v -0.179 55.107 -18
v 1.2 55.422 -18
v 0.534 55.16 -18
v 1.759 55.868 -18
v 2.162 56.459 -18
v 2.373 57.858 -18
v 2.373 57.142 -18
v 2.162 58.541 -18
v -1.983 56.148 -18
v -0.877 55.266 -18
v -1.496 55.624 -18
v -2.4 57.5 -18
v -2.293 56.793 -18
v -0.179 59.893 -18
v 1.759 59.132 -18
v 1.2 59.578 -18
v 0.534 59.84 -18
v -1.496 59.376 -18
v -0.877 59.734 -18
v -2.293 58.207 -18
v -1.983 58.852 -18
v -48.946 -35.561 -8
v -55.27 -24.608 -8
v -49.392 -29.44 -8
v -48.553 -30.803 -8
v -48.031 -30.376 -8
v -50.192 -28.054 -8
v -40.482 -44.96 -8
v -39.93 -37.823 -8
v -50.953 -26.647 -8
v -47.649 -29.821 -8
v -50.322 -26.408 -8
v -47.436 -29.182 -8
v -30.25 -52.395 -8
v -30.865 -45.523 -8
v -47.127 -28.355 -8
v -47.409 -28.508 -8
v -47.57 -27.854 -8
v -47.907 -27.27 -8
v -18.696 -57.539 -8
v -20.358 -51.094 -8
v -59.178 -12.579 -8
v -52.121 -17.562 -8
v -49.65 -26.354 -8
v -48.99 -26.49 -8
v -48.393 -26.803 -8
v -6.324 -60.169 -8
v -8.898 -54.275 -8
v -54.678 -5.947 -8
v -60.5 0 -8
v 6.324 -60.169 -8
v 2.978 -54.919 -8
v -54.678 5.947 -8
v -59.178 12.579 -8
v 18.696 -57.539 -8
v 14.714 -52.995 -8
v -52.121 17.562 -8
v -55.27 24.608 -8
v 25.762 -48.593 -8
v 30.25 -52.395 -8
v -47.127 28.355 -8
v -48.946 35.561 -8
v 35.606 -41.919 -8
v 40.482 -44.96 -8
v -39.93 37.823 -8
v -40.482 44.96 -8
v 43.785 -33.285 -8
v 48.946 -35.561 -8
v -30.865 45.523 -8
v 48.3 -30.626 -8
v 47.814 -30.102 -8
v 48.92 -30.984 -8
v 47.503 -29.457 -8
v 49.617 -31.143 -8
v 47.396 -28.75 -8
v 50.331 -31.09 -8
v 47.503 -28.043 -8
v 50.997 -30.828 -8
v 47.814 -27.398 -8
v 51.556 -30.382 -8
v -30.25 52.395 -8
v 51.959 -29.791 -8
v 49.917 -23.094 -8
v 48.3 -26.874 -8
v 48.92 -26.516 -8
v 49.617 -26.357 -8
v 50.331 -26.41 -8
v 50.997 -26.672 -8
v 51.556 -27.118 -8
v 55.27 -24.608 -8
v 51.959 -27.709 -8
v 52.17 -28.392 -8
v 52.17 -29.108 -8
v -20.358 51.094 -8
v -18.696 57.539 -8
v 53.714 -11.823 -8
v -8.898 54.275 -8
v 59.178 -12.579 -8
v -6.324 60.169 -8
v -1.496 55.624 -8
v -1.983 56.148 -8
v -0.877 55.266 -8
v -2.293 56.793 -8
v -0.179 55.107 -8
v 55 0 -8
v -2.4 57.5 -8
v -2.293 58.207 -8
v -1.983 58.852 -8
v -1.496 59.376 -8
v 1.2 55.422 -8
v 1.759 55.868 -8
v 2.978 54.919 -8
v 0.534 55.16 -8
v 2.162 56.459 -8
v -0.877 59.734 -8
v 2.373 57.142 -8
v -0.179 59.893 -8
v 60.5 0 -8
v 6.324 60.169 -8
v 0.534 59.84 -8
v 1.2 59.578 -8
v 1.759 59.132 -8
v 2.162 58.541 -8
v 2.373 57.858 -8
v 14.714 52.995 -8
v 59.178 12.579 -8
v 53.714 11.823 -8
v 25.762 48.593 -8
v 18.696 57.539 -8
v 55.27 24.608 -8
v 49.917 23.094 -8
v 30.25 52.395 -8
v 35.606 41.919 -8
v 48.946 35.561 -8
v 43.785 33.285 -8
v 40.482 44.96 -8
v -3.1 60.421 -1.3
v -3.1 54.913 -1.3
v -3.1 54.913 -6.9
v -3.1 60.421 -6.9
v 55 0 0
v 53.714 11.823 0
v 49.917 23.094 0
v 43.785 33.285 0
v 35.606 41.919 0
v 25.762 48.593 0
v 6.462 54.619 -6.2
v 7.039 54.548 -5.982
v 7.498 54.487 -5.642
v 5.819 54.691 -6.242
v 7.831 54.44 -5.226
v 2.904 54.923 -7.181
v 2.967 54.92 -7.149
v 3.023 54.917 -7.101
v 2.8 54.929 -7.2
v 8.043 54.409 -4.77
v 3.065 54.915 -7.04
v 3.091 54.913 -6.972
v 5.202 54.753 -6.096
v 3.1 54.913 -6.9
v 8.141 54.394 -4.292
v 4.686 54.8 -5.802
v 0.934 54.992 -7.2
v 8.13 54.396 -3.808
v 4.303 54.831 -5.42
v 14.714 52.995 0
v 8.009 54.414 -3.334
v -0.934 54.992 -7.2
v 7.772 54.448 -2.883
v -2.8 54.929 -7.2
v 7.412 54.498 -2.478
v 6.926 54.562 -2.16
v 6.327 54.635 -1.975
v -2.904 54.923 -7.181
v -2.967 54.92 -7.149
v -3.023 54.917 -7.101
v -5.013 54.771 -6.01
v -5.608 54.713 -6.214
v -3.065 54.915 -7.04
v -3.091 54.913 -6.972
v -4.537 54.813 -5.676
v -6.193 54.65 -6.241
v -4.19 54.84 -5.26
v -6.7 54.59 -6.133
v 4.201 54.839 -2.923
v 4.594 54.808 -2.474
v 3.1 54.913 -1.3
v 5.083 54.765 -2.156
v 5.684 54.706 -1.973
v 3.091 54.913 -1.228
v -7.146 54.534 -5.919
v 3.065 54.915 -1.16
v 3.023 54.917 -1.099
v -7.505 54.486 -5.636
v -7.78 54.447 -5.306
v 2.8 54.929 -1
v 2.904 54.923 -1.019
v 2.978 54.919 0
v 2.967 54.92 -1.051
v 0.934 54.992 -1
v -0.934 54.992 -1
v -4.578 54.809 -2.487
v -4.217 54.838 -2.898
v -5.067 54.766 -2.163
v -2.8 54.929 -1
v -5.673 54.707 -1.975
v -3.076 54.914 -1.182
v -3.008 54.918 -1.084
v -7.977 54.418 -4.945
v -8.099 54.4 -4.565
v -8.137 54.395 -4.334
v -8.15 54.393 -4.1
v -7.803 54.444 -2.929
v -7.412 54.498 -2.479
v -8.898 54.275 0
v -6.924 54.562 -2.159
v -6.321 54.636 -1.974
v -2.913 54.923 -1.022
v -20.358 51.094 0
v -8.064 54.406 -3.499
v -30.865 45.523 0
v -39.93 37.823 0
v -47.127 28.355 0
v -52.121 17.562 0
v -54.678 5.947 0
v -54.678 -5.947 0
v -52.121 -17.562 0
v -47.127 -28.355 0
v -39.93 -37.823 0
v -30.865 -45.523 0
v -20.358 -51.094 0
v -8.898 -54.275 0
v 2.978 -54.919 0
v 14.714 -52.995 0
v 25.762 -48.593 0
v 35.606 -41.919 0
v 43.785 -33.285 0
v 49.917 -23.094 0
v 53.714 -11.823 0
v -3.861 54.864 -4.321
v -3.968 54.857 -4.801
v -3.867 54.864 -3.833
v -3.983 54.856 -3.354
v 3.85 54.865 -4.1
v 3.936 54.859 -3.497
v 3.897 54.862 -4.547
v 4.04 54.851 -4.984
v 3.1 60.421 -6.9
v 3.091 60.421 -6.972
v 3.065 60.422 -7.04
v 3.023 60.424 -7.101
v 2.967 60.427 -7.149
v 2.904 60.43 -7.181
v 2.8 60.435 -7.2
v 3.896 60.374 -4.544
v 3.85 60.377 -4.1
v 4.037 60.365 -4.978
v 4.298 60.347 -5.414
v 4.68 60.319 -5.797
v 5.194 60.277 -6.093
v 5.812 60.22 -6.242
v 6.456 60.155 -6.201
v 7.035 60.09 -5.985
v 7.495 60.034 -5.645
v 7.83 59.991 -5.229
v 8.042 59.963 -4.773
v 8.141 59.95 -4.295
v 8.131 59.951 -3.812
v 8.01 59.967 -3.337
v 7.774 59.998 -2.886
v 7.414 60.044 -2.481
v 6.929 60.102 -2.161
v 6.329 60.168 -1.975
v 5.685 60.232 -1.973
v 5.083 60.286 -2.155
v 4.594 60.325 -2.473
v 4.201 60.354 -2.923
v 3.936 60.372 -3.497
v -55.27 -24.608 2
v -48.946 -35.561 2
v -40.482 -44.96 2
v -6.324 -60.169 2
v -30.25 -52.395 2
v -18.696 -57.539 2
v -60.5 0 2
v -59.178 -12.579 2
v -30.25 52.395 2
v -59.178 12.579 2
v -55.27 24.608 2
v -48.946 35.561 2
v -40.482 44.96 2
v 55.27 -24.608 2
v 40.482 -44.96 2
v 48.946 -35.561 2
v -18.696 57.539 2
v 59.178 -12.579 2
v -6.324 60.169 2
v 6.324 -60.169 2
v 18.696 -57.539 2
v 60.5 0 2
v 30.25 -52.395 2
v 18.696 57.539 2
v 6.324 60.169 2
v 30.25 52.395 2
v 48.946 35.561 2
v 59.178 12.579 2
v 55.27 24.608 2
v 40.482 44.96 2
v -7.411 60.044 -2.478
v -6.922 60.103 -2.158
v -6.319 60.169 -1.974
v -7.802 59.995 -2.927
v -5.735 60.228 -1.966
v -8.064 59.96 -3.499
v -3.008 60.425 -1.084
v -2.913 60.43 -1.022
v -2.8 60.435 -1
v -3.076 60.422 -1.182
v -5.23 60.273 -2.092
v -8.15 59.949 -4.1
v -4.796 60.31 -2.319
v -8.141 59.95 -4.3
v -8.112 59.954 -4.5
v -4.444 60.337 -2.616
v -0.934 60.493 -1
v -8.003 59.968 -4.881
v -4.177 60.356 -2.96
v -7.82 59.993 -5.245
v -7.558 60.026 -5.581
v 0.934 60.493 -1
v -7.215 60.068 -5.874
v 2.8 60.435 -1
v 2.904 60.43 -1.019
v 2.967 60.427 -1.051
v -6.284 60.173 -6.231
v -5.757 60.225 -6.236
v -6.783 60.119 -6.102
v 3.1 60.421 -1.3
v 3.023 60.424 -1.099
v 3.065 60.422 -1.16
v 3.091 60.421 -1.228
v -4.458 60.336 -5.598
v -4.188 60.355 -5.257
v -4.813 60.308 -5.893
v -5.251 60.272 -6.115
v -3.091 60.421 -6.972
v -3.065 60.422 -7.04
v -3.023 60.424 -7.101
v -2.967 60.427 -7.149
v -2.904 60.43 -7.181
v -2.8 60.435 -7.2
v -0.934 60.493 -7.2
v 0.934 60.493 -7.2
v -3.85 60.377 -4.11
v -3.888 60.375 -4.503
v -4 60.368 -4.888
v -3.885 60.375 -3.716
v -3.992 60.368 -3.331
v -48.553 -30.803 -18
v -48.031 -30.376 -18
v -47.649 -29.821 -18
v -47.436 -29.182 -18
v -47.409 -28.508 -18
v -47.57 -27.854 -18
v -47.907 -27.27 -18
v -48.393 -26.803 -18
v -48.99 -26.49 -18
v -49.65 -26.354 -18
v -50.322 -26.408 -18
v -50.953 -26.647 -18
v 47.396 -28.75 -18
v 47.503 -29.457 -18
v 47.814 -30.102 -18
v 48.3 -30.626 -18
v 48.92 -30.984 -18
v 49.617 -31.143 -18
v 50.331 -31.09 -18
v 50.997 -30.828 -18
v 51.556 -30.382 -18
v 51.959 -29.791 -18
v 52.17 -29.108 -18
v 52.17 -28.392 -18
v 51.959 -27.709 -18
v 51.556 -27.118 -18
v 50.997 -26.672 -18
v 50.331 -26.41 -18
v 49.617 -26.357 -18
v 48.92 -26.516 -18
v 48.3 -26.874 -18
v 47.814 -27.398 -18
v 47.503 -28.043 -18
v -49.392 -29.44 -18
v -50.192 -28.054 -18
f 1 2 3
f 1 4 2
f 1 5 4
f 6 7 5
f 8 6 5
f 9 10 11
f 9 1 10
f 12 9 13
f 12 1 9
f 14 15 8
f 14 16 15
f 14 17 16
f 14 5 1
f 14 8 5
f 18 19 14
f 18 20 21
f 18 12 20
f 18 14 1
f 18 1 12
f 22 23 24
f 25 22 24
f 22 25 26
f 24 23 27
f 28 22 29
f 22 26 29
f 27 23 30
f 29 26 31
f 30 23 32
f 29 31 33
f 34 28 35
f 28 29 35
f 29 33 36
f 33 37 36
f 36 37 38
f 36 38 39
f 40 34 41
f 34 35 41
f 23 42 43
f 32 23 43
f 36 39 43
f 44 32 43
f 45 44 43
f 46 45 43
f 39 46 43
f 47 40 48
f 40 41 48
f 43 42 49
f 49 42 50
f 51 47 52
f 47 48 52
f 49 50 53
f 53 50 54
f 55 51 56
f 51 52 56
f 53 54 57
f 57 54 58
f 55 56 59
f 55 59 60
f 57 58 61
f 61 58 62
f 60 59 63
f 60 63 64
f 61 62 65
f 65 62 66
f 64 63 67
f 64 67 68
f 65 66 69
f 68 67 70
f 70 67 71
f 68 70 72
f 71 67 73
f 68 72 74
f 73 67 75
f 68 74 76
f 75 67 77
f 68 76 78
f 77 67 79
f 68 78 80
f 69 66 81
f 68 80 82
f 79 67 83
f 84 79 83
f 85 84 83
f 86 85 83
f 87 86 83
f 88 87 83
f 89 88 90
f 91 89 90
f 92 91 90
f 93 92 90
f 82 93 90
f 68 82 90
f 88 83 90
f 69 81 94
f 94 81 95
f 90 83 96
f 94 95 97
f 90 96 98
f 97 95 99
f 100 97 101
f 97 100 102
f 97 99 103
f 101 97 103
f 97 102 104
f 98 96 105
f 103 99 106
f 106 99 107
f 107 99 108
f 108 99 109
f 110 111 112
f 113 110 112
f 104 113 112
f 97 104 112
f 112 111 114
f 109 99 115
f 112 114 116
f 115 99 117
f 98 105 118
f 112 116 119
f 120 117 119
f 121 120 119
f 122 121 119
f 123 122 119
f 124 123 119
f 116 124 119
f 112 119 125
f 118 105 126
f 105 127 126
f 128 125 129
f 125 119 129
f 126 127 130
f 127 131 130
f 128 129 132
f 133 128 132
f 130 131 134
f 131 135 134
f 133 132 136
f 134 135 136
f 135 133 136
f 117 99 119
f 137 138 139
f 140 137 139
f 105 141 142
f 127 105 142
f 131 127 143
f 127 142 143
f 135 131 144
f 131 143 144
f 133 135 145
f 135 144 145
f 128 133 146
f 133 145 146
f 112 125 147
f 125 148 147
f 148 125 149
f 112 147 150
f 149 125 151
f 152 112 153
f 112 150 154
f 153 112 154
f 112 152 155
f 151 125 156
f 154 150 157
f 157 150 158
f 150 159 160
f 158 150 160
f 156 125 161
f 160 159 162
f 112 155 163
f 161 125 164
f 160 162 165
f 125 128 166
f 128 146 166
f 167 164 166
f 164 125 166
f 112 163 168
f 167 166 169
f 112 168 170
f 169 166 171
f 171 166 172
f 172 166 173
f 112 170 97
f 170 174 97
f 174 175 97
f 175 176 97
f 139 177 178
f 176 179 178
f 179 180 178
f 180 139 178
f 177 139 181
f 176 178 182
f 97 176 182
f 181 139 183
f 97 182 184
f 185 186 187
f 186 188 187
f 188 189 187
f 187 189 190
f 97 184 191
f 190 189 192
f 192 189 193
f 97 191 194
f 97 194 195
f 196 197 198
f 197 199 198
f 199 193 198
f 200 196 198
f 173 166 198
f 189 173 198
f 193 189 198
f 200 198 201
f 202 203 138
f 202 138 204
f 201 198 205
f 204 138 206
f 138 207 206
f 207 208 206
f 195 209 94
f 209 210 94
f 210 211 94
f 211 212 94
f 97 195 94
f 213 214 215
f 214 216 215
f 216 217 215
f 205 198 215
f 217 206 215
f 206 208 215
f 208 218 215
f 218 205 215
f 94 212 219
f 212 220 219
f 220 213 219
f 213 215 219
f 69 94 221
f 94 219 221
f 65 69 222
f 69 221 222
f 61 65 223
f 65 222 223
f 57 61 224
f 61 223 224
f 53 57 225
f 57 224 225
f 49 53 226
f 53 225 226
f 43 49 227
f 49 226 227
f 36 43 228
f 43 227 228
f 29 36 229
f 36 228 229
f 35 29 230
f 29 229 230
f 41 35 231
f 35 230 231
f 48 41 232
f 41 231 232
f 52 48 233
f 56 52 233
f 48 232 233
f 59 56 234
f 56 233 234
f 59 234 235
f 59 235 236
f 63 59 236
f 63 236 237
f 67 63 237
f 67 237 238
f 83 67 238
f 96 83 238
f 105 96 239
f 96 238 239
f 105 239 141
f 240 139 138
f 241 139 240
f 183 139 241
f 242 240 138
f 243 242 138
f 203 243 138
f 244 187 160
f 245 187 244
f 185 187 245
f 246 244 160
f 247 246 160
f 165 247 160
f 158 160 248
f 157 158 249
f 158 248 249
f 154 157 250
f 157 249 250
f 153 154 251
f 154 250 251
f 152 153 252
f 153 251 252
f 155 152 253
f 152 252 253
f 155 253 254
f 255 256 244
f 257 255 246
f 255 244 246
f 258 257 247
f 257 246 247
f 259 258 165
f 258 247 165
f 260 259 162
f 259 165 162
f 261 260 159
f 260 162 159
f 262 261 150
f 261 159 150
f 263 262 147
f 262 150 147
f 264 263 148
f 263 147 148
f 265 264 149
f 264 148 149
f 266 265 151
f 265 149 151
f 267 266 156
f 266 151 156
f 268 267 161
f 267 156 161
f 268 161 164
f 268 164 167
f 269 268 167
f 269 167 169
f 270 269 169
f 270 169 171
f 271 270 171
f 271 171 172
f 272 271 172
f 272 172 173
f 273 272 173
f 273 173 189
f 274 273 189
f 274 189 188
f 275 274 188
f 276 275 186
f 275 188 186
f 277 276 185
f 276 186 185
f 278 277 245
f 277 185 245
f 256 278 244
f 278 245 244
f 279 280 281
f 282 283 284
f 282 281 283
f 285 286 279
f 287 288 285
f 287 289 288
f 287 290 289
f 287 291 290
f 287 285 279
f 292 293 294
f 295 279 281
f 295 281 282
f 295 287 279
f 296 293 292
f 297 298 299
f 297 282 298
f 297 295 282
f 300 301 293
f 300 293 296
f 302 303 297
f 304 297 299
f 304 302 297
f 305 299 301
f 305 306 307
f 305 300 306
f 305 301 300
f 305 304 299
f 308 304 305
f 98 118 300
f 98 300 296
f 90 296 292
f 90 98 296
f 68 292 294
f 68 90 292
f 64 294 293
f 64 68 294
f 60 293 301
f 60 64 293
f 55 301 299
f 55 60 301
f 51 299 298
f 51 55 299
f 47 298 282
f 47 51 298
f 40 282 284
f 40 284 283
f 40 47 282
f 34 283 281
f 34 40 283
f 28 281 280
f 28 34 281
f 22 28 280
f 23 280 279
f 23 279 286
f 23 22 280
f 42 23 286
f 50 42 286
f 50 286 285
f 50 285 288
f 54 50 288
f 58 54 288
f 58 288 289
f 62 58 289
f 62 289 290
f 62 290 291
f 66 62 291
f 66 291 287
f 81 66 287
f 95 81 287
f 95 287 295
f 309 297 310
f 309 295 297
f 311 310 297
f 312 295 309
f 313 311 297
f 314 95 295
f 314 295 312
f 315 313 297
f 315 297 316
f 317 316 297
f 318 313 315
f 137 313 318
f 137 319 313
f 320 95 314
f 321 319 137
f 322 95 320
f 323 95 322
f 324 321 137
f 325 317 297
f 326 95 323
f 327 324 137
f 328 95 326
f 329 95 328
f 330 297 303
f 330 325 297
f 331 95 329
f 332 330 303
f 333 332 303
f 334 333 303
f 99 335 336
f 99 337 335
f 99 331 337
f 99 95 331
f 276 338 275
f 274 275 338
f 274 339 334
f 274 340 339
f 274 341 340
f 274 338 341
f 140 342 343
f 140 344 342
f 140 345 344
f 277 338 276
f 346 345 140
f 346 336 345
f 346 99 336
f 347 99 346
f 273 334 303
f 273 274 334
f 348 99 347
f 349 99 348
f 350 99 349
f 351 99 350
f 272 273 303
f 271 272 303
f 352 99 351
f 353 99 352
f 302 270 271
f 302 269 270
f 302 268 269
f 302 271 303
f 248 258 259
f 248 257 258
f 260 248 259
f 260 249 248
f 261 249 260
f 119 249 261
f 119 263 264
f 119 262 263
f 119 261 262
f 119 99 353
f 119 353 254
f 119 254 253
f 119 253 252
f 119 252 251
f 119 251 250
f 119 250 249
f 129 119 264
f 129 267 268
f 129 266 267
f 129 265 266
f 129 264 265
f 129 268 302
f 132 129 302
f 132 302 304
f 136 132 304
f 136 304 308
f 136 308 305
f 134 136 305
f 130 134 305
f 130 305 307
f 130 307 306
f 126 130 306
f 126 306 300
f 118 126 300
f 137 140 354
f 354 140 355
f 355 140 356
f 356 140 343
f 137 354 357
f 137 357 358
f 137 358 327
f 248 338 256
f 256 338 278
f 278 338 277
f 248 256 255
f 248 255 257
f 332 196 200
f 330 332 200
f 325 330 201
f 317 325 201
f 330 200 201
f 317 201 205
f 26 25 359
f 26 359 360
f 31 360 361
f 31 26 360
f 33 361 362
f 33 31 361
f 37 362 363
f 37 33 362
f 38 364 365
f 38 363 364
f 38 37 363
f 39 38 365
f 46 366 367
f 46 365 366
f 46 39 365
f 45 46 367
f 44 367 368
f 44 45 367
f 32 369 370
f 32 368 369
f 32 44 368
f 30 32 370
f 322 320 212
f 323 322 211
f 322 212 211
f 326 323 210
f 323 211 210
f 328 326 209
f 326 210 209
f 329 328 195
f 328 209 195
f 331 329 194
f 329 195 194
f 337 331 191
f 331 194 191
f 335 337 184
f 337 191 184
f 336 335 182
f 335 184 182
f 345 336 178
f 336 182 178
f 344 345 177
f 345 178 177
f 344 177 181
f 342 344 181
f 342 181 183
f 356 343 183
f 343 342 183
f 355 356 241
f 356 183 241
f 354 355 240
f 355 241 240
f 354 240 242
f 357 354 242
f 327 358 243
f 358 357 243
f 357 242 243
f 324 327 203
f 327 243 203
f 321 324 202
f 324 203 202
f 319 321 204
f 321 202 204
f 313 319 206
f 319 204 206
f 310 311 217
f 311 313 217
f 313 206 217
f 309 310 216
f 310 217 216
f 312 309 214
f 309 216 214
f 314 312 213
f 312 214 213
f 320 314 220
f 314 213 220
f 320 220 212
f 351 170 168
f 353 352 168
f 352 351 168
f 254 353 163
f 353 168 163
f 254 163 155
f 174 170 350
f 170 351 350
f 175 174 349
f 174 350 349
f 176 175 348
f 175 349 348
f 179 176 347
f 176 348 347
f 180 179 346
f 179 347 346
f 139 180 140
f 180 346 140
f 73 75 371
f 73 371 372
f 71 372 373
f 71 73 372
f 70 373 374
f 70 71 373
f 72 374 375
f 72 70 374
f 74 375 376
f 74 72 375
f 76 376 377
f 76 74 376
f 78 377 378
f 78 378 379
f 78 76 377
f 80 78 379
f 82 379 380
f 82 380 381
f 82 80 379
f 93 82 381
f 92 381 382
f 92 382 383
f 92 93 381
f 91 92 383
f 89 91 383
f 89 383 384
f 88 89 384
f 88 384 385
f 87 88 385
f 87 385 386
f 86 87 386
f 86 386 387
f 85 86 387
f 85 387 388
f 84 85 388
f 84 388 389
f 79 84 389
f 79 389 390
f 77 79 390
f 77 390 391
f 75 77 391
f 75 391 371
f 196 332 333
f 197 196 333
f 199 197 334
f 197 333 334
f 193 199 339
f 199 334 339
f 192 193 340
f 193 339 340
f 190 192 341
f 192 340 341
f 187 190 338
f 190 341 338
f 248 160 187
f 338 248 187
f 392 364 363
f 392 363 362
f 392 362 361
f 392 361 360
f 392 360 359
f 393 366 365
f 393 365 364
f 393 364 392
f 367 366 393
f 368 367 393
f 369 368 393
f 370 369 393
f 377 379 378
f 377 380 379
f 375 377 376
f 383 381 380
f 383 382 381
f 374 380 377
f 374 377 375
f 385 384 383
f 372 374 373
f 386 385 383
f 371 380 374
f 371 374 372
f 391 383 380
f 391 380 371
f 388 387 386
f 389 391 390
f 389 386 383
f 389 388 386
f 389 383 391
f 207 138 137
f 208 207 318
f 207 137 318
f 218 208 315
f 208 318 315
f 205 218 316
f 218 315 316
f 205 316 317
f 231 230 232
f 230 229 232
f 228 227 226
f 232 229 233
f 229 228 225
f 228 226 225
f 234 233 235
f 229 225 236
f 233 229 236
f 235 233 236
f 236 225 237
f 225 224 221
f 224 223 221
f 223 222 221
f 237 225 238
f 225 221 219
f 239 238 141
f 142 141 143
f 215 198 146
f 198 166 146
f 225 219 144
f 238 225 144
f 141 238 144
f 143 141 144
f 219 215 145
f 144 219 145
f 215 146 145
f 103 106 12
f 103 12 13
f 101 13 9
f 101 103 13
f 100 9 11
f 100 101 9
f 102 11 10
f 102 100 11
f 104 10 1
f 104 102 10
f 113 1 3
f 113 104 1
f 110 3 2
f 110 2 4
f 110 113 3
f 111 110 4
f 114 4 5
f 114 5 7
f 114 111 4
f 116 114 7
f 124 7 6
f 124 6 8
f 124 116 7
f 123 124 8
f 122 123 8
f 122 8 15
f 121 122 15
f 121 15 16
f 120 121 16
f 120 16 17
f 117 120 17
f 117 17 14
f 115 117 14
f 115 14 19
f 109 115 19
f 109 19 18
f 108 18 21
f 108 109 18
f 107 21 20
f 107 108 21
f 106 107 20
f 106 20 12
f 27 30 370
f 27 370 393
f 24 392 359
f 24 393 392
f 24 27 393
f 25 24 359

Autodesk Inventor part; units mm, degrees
ref_plane "YZ Plane" through (0, 0, 0) normal (1, 0, 0) x (0, 1, 0)
ref_plane "XZ Plane" through (0, 0, 0) normal (0, 1, 0) x (-1, 0, 0)
ref_plane "XY Plane" through (0, 0, 0) normal (0, 0, 1) x (1, 0, 0)
sketch "Sketch1" plane through (0, 0, 0) normal (0, 0, 1) x (1, 0, 0)
  circle A0 centre (0, 0) radius 60.5
  circle A1 centre (0, 0) radius 55
  line L0 (0, 55) -> (-10, 55)
  line L1 (0, 55) -> (10, 55)
  line L2 (0, 55) -> (10, 55) construction
  line L3 (10, 59.6678) -> (10, 53.8845)
  line L4 (-10, 59.6678) -> (-10, 54.0833)
  point P0 (10, 54.0833)
  dimension "d0" = 121
  dimension "d1" = 110
  dimension "d45" = 10
  dimension "d46" = 10
  dimension "d47" = 0
extrude "Extrusion1" add sketch "Sketch1" along normal blind 2
extrude "Extrusion2" add sketch "Sketch1" against normal blind 8 contours A0 L4 A1 L3 | L3 L1 L0 L4 A0 | L3 A1 L1 | L0 A1 L4
sketch "Sketch11" plane through (0, 0, 0) normal (1, 0, 0) x (0, 1, 0)
  line L0 (60.5, 2) -> (-60.5, 2) projected
  line L1 (-60.5, -8) -> (60.5, -8) projected
  line L2 (59.6678, 0) -> (54.0833, 0) projected
  line L3 (59.6678, 0) -> (59.6678, -6) projected
  line L4 (54.0833, -6) -> (59.6678, -6) projected
  line L5 (54.0833, 0) -> (54.0833, -6) projected
  line L6 (-60.5, -8) -> (60.5, -8) projected
  line L7 (55, -8) -> (-55, -8) projected
  line L8 (-60.5, -8) -> (60.5, -8) projected
  line L9 (60.5, 0) -> (-60.5, 0) projected
  line L10 (-55, -8) -> (-61, -8)
  line L11 (-61, -8) -> (-61, 0)
  line L12 (-61, 0) -> (-55, 0)
  line L13 (-55, 0) -> (-55, -8)
  line L14 (-61, -8) -> (-55, 0)
  circle A0 centre (-58, -4) radius 2.1
  line L15 (-61, -8) -> (-67, -8)
  line L16 (-67, -8) -> (-67, -2)
  line L17 (-67, -2) -> (-61, -2)
  line L18 (-61, -2) -> (-61, -8)
  line L19 (-61, -8) -> (-67, -2)
  circle A1 centre (-64, -5) radius 2.15
  point P0 (0, 0)
  point P1 (42.0833, 0)
  point P2 (42.0833, -6)
  point P3 (48.0833, -6)
  dimension "d48" = 6
  dimension "d49" = 4.2
  dimension "d50" = 6
  dimension "d51" = 6
  dimension "d52" = 4.3
sketch "Sketch12" plane through (0, 0, 2) normal (0, 0, 1) x (1, 0, 0)
  point P0 (0, 0)
sketch "Sketch13" plane through (0, 0, 0) normal (0, 1, 0) x (-1, 0, 0)
  line L0 (0, -6) -> (0, 2)
  line L1 (0, 0) -> (0, -1)
  line L2 (0, -1) -> (3.1, -1)
  line L3 (3.1, -1) -> (3.1, -7.2)
  line L4 (3.1, -7.2) -> (0, -7.2)
  line L5 (0, -7.2) -> (0, -1)
  line L6 (3.1, -7.2) -> (-3.1, -7.2)
  line L7 (-3.1, -7.2) -> (-3.1, -1)
  line L8 (-3.1, -1) -> (3.1, -1)
  line L9 (3.1, -1) -> (3.1, -7.2)
  line L10 (0, -4.1) -> (6, -4.1)
  line L11 (6, -4.1) -> (-6, -4.1)
  circle A0 centre (-6, -4.1) radius 2.15
  circle A1 centre (6, -4.1) radius 2.15
  point P0 (0, -7.2)
  dimension "d58" = 1
  dimension "d59" = 3.1
  dimension "d60" = 6.2
  dimension "d61" = 6.2
  dimension "d62" = 6.2
  dimension "d66" = 6
  dimension "d67" = 12
  dimension "d68" = 4.3
  dimension "d69" = 4.3
extrude "Extrusion12" cut sketch "Sketch13" along normal through all
fillet "Fillet3" radius 0.3 4 edges at (-3.1, 57.6665, -1) (3.1, 57.6665, -1) (3.1, 57.6665, -7.2) (-3.1, 57.6665, -7.2)
sketch "Sketch14" plane through (0, 0, -8) normal (0, 0, -1) x (-1, 0, 0)
  circle A0 centre (0, 0) radius 57.5
  circle A1 centre (0, 57.5) radius 2.4
  circle A2 centre (-49.7965, -28.75) radius 2.4
  circle A3 centre (49.7965, -28.75) radius 2.4
  point P0 (50.9528, -26.6469)
  point P1 (48.5533, -30.803)
  dimension "d70" = 115
  dimension "d71" = 4.8
  dimension "d74" = 360
extrude "Extrusion13" add sketch "Sketch14" along normal blind 10 contours A1 A0 | A0 A1 | A0 A3 | A2 A0 | A0 A2 picked at (49.0578, -28.4334)
properties part number "Cover"
